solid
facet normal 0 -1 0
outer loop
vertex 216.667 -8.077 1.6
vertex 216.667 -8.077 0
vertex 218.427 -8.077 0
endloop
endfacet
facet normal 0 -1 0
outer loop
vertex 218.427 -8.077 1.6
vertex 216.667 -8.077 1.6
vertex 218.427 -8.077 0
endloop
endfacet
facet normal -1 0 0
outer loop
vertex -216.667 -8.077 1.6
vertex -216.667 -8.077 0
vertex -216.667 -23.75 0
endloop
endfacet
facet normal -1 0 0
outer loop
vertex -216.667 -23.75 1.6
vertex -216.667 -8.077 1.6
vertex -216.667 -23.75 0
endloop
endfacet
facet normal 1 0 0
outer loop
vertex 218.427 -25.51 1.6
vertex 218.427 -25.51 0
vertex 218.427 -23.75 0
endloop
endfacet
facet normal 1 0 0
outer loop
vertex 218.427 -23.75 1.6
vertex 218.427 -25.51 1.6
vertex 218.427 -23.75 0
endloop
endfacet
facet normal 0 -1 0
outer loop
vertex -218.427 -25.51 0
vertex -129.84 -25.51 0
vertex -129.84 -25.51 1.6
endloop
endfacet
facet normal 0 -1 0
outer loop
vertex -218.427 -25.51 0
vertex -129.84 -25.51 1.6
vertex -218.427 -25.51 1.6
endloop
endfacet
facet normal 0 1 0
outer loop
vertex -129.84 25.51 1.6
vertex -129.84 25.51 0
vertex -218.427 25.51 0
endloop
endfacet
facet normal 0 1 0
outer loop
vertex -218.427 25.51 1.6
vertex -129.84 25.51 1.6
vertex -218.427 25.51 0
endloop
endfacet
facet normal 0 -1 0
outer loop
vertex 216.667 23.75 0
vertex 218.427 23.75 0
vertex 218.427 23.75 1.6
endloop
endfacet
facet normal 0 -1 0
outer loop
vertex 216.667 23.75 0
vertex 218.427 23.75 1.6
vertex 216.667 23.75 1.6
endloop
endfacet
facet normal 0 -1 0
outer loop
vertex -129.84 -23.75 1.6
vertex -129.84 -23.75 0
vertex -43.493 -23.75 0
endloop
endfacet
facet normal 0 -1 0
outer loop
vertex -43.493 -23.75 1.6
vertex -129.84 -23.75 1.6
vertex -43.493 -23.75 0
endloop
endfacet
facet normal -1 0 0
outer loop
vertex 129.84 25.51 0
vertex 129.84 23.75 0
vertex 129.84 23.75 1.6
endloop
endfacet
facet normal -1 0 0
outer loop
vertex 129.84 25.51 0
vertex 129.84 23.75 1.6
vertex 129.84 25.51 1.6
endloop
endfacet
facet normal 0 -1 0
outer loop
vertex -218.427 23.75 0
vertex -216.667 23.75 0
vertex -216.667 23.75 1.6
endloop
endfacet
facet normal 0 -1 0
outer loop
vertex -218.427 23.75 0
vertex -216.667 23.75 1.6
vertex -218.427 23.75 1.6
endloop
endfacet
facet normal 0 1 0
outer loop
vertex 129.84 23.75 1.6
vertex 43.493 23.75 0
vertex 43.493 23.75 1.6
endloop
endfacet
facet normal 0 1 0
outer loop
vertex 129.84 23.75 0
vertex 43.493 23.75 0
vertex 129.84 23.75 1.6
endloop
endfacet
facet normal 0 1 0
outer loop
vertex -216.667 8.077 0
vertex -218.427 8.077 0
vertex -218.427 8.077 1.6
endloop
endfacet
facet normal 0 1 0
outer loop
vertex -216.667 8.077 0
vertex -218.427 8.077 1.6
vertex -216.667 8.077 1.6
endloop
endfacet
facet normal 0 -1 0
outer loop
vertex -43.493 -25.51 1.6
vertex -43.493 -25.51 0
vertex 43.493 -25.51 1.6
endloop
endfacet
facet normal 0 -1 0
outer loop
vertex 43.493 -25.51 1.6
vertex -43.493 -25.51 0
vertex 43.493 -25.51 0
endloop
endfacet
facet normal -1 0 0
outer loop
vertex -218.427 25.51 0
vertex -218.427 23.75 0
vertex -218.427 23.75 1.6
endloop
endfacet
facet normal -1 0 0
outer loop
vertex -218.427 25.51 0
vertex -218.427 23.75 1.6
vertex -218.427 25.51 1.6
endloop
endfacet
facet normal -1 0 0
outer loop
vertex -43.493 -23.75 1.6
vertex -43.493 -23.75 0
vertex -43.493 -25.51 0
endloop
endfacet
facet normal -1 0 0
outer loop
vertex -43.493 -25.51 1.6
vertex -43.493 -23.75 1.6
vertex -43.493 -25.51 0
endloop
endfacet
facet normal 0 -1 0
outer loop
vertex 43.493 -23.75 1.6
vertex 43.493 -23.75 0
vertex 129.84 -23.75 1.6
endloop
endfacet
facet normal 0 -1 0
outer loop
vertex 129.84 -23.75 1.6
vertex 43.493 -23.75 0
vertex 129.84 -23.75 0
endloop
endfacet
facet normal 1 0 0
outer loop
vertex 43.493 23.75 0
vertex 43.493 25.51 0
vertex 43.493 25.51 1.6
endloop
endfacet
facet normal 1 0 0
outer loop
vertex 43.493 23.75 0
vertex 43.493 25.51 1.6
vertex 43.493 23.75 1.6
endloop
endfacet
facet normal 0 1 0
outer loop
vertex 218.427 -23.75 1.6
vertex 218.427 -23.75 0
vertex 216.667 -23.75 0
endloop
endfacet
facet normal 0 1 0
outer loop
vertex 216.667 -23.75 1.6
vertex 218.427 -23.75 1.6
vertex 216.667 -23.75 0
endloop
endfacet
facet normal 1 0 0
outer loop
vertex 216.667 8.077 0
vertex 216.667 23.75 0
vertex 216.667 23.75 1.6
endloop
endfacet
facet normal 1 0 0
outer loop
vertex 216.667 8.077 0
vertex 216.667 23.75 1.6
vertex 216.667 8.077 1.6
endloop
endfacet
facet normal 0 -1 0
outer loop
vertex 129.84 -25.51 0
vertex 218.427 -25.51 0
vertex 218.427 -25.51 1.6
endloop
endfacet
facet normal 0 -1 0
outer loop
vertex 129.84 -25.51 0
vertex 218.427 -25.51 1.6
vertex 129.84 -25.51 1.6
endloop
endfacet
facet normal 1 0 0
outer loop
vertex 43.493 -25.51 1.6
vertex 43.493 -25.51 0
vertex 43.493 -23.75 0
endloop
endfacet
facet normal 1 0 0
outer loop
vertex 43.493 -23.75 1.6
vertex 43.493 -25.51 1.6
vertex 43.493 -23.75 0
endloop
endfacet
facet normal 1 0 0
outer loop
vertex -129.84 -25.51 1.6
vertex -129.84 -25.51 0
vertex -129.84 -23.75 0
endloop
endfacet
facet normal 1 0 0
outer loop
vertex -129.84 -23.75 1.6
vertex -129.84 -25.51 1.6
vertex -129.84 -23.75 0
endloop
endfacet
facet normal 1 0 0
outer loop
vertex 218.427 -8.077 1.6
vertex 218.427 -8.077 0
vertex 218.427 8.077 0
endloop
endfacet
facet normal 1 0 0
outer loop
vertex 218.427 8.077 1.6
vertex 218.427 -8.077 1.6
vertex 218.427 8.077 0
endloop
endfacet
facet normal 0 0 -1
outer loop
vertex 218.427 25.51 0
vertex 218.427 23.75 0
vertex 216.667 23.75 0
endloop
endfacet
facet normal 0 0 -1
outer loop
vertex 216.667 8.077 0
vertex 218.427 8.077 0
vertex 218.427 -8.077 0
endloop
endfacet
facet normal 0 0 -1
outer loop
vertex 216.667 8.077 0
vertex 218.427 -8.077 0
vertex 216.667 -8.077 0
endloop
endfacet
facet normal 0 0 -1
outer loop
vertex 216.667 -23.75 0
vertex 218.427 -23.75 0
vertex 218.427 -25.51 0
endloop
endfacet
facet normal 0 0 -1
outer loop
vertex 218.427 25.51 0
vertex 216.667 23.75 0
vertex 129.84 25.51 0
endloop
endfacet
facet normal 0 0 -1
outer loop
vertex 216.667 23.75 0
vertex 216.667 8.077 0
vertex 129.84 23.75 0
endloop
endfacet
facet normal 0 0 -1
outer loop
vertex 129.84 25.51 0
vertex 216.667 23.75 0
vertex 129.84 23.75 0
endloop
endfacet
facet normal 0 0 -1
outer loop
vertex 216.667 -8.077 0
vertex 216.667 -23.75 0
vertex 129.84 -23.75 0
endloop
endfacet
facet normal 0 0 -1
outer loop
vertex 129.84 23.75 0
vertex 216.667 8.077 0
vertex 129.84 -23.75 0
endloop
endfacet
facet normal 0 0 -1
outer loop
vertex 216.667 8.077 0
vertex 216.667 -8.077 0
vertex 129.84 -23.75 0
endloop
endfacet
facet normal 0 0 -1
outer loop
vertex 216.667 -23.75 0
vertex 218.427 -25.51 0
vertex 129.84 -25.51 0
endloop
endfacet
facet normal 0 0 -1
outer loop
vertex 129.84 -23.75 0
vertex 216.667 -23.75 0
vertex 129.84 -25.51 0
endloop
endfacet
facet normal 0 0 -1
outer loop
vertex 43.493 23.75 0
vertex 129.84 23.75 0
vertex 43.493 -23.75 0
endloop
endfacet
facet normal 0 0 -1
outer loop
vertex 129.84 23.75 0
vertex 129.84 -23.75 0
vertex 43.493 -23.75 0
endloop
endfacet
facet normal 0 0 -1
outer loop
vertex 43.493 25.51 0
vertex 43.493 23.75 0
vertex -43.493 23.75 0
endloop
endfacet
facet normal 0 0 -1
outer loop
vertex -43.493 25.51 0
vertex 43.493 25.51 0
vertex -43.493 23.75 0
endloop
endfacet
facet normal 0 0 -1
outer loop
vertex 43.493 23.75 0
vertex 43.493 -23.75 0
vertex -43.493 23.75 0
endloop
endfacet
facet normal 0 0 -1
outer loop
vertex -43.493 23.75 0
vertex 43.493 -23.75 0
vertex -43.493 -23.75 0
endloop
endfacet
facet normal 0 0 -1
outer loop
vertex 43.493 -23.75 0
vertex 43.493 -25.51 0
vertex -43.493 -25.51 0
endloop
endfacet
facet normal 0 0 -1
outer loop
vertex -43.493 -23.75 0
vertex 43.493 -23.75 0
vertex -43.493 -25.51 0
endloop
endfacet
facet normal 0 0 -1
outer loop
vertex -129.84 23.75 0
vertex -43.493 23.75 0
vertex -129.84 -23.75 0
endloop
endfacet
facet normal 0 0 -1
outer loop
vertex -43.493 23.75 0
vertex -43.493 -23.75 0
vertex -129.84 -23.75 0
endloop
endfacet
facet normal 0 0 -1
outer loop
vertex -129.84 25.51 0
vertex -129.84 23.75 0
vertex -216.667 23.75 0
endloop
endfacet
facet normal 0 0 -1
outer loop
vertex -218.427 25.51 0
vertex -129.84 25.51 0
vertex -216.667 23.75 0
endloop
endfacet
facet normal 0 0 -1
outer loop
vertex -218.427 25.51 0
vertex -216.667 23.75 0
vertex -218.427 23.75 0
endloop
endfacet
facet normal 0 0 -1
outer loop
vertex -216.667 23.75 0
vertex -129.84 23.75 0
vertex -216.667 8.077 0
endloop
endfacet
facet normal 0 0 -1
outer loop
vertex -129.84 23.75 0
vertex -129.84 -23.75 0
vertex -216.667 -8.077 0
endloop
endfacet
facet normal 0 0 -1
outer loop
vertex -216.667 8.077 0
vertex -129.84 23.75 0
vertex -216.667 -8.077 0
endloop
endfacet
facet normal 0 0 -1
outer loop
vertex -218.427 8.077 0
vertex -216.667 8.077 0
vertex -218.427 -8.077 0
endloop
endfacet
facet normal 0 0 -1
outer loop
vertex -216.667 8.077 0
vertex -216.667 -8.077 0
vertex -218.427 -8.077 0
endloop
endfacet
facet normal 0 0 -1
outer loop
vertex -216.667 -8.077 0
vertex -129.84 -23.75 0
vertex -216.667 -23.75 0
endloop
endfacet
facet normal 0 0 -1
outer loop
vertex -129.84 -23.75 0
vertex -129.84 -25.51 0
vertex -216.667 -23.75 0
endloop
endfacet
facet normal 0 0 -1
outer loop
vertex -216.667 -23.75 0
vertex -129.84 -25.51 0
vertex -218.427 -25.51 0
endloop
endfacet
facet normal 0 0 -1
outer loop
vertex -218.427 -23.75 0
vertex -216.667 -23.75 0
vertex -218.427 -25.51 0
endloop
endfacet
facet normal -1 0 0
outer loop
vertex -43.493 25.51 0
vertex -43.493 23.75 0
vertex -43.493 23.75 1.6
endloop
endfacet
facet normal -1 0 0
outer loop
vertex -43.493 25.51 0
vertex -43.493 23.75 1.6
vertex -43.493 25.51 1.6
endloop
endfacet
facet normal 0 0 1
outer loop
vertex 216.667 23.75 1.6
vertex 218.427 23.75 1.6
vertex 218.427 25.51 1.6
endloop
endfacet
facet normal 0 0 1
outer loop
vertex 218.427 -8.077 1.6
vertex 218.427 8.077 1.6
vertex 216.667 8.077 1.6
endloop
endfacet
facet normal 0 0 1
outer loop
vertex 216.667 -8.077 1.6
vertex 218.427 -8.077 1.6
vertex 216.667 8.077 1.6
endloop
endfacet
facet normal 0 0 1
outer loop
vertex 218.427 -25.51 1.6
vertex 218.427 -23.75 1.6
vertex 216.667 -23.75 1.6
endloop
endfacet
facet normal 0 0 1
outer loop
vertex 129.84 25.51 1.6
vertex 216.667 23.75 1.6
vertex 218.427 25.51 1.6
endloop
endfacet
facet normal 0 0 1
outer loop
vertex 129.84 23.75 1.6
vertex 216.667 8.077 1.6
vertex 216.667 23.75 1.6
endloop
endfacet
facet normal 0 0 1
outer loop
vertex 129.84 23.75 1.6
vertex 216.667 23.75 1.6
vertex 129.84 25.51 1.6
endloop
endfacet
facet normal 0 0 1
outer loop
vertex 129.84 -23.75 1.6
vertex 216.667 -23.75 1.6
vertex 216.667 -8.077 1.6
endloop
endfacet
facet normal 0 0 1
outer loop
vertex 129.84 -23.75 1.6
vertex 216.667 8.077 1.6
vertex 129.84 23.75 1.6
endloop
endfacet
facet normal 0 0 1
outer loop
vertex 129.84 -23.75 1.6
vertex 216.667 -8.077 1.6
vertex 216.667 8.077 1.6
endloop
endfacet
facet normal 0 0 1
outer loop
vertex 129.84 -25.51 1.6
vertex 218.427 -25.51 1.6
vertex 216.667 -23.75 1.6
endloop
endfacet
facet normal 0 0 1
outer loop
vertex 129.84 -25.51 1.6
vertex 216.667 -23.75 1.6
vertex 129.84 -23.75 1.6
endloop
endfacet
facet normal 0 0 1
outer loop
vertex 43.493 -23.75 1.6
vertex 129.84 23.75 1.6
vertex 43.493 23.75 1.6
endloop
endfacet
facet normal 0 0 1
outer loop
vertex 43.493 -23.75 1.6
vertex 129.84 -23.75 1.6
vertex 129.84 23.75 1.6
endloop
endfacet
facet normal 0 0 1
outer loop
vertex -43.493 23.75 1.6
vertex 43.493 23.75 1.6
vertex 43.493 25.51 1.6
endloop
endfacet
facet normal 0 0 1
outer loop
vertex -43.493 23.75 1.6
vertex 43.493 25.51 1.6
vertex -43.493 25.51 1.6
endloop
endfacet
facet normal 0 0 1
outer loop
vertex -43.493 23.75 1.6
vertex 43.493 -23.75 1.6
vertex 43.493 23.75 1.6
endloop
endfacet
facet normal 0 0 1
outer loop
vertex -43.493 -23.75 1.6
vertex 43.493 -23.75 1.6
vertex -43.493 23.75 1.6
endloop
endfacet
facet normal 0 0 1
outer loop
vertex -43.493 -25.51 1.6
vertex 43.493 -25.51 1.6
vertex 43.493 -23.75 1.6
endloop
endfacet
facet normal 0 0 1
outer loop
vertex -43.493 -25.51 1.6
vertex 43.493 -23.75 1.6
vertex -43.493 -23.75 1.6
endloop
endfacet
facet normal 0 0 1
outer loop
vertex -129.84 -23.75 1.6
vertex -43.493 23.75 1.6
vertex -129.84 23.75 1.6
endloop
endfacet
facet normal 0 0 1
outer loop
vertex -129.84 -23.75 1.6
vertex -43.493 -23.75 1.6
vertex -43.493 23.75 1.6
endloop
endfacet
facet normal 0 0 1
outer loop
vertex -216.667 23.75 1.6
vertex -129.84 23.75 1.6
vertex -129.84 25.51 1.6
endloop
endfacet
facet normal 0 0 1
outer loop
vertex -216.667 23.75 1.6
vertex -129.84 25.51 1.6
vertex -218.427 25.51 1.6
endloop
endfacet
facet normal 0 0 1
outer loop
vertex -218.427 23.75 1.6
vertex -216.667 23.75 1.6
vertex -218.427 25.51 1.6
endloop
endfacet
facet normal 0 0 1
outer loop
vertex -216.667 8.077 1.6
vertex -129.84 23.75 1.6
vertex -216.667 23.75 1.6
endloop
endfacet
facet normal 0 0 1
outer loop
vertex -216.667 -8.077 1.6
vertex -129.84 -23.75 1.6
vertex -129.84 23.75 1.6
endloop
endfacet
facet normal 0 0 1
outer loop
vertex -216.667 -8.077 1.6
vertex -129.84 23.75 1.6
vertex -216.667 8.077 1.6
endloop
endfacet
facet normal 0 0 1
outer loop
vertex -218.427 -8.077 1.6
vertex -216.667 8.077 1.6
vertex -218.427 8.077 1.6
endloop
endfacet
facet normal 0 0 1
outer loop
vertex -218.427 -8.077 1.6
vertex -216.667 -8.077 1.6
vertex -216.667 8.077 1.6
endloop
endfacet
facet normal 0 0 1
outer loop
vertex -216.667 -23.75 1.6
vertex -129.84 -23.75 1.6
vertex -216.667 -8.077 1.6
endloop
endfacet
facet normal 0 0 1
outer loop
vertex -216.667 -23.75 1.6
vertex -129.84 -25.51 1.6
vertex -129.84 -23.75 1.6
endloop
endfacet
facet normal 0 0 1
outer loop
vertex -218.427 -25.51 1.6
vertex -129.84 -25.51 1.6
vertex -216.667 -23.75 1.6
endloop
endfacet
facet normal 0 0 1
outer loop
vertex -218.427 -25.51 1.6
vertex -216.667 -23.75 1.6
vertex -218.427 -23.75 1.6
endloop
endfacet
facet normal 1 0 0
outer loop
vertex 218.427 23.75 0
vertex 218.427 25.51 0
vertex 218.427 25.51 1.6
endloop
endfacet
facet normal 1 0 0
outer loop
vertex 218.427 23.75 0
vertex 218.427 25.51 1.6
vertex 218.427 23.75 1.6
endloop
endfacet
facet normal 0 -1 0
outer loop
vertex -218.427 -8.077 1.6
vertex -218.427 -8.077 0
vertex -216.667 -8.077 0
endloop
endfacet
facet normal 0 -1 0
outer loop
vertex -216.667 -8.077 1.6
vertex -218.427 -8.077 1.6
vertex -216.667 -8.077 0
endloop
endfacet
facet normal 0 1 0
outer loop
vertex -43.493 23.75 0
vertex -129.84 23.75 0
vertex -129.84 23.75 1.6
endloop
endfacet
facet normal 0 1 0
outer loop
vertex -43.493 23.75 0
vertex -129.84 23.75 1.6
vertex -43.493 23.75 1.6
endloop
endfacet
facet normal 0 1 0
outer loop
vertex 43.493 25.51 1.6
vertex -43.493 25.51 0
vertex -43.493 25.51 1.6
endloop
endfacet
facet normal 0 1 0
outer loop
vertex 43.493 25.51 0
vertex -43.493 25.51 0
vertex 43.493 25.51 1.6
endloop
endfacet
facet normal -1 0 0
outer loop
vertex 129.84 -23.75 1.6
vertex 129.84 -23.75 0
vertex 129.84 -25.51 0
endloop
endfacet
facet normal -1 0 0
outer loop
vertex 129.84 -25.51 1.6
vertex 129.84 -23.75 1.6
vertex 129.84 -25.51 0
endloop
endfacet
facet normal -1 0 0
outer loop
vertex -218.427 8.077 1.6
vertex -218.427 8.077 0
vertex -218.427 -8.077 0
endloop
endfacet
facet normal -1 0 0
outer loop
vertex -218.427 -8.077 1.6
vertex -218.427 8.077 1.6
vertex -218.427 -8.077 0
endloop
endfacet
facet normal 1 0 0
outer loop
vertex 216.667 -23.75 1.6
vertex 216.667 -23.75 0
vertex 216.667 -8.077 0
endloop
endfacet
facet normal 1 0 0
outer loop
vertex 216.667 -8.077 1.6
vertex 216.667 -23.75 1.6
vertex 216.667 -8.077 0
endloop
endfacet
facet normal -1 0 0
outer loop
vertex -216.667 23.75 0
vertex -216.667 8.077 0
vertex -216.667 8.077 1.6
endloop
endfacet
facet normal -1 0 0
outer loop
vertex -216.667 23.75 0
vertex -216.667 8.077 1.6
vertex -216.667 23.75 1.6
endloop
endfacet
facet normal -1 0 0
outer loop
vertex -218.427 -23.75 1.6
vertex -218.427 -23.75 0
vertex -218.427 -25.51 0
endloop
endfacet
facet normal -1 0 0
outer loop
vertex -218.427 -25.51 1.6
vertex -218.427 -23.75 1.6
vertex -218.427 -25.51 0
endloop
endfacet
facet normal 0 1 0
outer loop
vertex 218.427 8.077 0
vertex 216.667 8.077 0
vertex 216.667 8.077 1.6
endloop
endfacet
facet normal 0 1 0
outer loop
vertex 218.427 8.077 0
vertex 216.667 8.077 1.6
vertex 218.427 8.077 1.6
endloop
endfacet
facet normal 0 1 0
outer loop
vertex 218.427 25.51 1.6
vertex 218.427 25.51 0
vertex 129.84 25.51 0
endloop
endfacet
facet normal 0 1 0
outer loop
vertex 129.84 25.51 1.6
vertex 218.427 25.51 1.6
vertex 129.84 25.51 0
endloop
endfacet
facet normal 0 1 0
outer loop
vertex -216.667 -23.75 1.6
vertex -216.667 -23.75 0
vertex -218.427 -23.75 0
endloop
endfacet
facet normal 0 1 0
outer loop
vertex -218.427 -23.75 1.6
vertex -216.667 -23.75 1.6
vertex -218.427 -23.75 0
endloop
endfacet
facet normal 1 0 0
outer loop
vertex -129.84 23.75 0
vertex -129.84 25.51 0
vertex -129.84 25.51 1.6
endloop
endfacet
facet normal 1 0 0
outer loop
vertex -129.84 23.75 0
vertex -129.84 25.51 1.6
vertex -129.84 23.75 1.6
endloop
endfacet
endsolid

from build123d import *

# Parameters (mm, degrees)
BOSS_EXTRUDE1_DEPTH = 1.6


with BuildPart() as part:
    # Sketch1 → Boss-Extrude1 (new body)
    with BuildSketch(Plane.XY):
        Polygon((-218.4266645, 25.51), (-216.6666645, 25.51), (-129.8399987, 25.51), (-129.8399987, 23.75), (-43.4933329, 23.75), (-43.4933329, 25.51), (43.4933329, 25.51), (43.4933329, 23.75), (129.8399987, 23.75), (129.8399987, 25.51), (216.6666645, 25.51), (218.4266645, 25.51), (218.4266645, 23.75), (216.6666645, 23.75), (216.6666645, 8.076666667), (218.4266645, 8.076666667), (218.4266645, 0), (216.6666645, 0), (0, 0), (-216.6666645, 0), (-218.4266645, 0), (-218.4266645, 8.076666667), (-216.6666645, 8.076666667), (-216.6666645, 23.75), (-218.4266645, 23.75), align=None)
    boss_extrude1 = extrude(amount=BOSS_EXTRUDE1_DEPTH)

    # Mirror4: Boss-Extrude1 across plane
    add(boss_extrude1.mirror(Plane(origin=(0, 0, 1.6), x_dir=(0, 0, 1), z_dir=(0, 1, 0))))


solid = part.part
